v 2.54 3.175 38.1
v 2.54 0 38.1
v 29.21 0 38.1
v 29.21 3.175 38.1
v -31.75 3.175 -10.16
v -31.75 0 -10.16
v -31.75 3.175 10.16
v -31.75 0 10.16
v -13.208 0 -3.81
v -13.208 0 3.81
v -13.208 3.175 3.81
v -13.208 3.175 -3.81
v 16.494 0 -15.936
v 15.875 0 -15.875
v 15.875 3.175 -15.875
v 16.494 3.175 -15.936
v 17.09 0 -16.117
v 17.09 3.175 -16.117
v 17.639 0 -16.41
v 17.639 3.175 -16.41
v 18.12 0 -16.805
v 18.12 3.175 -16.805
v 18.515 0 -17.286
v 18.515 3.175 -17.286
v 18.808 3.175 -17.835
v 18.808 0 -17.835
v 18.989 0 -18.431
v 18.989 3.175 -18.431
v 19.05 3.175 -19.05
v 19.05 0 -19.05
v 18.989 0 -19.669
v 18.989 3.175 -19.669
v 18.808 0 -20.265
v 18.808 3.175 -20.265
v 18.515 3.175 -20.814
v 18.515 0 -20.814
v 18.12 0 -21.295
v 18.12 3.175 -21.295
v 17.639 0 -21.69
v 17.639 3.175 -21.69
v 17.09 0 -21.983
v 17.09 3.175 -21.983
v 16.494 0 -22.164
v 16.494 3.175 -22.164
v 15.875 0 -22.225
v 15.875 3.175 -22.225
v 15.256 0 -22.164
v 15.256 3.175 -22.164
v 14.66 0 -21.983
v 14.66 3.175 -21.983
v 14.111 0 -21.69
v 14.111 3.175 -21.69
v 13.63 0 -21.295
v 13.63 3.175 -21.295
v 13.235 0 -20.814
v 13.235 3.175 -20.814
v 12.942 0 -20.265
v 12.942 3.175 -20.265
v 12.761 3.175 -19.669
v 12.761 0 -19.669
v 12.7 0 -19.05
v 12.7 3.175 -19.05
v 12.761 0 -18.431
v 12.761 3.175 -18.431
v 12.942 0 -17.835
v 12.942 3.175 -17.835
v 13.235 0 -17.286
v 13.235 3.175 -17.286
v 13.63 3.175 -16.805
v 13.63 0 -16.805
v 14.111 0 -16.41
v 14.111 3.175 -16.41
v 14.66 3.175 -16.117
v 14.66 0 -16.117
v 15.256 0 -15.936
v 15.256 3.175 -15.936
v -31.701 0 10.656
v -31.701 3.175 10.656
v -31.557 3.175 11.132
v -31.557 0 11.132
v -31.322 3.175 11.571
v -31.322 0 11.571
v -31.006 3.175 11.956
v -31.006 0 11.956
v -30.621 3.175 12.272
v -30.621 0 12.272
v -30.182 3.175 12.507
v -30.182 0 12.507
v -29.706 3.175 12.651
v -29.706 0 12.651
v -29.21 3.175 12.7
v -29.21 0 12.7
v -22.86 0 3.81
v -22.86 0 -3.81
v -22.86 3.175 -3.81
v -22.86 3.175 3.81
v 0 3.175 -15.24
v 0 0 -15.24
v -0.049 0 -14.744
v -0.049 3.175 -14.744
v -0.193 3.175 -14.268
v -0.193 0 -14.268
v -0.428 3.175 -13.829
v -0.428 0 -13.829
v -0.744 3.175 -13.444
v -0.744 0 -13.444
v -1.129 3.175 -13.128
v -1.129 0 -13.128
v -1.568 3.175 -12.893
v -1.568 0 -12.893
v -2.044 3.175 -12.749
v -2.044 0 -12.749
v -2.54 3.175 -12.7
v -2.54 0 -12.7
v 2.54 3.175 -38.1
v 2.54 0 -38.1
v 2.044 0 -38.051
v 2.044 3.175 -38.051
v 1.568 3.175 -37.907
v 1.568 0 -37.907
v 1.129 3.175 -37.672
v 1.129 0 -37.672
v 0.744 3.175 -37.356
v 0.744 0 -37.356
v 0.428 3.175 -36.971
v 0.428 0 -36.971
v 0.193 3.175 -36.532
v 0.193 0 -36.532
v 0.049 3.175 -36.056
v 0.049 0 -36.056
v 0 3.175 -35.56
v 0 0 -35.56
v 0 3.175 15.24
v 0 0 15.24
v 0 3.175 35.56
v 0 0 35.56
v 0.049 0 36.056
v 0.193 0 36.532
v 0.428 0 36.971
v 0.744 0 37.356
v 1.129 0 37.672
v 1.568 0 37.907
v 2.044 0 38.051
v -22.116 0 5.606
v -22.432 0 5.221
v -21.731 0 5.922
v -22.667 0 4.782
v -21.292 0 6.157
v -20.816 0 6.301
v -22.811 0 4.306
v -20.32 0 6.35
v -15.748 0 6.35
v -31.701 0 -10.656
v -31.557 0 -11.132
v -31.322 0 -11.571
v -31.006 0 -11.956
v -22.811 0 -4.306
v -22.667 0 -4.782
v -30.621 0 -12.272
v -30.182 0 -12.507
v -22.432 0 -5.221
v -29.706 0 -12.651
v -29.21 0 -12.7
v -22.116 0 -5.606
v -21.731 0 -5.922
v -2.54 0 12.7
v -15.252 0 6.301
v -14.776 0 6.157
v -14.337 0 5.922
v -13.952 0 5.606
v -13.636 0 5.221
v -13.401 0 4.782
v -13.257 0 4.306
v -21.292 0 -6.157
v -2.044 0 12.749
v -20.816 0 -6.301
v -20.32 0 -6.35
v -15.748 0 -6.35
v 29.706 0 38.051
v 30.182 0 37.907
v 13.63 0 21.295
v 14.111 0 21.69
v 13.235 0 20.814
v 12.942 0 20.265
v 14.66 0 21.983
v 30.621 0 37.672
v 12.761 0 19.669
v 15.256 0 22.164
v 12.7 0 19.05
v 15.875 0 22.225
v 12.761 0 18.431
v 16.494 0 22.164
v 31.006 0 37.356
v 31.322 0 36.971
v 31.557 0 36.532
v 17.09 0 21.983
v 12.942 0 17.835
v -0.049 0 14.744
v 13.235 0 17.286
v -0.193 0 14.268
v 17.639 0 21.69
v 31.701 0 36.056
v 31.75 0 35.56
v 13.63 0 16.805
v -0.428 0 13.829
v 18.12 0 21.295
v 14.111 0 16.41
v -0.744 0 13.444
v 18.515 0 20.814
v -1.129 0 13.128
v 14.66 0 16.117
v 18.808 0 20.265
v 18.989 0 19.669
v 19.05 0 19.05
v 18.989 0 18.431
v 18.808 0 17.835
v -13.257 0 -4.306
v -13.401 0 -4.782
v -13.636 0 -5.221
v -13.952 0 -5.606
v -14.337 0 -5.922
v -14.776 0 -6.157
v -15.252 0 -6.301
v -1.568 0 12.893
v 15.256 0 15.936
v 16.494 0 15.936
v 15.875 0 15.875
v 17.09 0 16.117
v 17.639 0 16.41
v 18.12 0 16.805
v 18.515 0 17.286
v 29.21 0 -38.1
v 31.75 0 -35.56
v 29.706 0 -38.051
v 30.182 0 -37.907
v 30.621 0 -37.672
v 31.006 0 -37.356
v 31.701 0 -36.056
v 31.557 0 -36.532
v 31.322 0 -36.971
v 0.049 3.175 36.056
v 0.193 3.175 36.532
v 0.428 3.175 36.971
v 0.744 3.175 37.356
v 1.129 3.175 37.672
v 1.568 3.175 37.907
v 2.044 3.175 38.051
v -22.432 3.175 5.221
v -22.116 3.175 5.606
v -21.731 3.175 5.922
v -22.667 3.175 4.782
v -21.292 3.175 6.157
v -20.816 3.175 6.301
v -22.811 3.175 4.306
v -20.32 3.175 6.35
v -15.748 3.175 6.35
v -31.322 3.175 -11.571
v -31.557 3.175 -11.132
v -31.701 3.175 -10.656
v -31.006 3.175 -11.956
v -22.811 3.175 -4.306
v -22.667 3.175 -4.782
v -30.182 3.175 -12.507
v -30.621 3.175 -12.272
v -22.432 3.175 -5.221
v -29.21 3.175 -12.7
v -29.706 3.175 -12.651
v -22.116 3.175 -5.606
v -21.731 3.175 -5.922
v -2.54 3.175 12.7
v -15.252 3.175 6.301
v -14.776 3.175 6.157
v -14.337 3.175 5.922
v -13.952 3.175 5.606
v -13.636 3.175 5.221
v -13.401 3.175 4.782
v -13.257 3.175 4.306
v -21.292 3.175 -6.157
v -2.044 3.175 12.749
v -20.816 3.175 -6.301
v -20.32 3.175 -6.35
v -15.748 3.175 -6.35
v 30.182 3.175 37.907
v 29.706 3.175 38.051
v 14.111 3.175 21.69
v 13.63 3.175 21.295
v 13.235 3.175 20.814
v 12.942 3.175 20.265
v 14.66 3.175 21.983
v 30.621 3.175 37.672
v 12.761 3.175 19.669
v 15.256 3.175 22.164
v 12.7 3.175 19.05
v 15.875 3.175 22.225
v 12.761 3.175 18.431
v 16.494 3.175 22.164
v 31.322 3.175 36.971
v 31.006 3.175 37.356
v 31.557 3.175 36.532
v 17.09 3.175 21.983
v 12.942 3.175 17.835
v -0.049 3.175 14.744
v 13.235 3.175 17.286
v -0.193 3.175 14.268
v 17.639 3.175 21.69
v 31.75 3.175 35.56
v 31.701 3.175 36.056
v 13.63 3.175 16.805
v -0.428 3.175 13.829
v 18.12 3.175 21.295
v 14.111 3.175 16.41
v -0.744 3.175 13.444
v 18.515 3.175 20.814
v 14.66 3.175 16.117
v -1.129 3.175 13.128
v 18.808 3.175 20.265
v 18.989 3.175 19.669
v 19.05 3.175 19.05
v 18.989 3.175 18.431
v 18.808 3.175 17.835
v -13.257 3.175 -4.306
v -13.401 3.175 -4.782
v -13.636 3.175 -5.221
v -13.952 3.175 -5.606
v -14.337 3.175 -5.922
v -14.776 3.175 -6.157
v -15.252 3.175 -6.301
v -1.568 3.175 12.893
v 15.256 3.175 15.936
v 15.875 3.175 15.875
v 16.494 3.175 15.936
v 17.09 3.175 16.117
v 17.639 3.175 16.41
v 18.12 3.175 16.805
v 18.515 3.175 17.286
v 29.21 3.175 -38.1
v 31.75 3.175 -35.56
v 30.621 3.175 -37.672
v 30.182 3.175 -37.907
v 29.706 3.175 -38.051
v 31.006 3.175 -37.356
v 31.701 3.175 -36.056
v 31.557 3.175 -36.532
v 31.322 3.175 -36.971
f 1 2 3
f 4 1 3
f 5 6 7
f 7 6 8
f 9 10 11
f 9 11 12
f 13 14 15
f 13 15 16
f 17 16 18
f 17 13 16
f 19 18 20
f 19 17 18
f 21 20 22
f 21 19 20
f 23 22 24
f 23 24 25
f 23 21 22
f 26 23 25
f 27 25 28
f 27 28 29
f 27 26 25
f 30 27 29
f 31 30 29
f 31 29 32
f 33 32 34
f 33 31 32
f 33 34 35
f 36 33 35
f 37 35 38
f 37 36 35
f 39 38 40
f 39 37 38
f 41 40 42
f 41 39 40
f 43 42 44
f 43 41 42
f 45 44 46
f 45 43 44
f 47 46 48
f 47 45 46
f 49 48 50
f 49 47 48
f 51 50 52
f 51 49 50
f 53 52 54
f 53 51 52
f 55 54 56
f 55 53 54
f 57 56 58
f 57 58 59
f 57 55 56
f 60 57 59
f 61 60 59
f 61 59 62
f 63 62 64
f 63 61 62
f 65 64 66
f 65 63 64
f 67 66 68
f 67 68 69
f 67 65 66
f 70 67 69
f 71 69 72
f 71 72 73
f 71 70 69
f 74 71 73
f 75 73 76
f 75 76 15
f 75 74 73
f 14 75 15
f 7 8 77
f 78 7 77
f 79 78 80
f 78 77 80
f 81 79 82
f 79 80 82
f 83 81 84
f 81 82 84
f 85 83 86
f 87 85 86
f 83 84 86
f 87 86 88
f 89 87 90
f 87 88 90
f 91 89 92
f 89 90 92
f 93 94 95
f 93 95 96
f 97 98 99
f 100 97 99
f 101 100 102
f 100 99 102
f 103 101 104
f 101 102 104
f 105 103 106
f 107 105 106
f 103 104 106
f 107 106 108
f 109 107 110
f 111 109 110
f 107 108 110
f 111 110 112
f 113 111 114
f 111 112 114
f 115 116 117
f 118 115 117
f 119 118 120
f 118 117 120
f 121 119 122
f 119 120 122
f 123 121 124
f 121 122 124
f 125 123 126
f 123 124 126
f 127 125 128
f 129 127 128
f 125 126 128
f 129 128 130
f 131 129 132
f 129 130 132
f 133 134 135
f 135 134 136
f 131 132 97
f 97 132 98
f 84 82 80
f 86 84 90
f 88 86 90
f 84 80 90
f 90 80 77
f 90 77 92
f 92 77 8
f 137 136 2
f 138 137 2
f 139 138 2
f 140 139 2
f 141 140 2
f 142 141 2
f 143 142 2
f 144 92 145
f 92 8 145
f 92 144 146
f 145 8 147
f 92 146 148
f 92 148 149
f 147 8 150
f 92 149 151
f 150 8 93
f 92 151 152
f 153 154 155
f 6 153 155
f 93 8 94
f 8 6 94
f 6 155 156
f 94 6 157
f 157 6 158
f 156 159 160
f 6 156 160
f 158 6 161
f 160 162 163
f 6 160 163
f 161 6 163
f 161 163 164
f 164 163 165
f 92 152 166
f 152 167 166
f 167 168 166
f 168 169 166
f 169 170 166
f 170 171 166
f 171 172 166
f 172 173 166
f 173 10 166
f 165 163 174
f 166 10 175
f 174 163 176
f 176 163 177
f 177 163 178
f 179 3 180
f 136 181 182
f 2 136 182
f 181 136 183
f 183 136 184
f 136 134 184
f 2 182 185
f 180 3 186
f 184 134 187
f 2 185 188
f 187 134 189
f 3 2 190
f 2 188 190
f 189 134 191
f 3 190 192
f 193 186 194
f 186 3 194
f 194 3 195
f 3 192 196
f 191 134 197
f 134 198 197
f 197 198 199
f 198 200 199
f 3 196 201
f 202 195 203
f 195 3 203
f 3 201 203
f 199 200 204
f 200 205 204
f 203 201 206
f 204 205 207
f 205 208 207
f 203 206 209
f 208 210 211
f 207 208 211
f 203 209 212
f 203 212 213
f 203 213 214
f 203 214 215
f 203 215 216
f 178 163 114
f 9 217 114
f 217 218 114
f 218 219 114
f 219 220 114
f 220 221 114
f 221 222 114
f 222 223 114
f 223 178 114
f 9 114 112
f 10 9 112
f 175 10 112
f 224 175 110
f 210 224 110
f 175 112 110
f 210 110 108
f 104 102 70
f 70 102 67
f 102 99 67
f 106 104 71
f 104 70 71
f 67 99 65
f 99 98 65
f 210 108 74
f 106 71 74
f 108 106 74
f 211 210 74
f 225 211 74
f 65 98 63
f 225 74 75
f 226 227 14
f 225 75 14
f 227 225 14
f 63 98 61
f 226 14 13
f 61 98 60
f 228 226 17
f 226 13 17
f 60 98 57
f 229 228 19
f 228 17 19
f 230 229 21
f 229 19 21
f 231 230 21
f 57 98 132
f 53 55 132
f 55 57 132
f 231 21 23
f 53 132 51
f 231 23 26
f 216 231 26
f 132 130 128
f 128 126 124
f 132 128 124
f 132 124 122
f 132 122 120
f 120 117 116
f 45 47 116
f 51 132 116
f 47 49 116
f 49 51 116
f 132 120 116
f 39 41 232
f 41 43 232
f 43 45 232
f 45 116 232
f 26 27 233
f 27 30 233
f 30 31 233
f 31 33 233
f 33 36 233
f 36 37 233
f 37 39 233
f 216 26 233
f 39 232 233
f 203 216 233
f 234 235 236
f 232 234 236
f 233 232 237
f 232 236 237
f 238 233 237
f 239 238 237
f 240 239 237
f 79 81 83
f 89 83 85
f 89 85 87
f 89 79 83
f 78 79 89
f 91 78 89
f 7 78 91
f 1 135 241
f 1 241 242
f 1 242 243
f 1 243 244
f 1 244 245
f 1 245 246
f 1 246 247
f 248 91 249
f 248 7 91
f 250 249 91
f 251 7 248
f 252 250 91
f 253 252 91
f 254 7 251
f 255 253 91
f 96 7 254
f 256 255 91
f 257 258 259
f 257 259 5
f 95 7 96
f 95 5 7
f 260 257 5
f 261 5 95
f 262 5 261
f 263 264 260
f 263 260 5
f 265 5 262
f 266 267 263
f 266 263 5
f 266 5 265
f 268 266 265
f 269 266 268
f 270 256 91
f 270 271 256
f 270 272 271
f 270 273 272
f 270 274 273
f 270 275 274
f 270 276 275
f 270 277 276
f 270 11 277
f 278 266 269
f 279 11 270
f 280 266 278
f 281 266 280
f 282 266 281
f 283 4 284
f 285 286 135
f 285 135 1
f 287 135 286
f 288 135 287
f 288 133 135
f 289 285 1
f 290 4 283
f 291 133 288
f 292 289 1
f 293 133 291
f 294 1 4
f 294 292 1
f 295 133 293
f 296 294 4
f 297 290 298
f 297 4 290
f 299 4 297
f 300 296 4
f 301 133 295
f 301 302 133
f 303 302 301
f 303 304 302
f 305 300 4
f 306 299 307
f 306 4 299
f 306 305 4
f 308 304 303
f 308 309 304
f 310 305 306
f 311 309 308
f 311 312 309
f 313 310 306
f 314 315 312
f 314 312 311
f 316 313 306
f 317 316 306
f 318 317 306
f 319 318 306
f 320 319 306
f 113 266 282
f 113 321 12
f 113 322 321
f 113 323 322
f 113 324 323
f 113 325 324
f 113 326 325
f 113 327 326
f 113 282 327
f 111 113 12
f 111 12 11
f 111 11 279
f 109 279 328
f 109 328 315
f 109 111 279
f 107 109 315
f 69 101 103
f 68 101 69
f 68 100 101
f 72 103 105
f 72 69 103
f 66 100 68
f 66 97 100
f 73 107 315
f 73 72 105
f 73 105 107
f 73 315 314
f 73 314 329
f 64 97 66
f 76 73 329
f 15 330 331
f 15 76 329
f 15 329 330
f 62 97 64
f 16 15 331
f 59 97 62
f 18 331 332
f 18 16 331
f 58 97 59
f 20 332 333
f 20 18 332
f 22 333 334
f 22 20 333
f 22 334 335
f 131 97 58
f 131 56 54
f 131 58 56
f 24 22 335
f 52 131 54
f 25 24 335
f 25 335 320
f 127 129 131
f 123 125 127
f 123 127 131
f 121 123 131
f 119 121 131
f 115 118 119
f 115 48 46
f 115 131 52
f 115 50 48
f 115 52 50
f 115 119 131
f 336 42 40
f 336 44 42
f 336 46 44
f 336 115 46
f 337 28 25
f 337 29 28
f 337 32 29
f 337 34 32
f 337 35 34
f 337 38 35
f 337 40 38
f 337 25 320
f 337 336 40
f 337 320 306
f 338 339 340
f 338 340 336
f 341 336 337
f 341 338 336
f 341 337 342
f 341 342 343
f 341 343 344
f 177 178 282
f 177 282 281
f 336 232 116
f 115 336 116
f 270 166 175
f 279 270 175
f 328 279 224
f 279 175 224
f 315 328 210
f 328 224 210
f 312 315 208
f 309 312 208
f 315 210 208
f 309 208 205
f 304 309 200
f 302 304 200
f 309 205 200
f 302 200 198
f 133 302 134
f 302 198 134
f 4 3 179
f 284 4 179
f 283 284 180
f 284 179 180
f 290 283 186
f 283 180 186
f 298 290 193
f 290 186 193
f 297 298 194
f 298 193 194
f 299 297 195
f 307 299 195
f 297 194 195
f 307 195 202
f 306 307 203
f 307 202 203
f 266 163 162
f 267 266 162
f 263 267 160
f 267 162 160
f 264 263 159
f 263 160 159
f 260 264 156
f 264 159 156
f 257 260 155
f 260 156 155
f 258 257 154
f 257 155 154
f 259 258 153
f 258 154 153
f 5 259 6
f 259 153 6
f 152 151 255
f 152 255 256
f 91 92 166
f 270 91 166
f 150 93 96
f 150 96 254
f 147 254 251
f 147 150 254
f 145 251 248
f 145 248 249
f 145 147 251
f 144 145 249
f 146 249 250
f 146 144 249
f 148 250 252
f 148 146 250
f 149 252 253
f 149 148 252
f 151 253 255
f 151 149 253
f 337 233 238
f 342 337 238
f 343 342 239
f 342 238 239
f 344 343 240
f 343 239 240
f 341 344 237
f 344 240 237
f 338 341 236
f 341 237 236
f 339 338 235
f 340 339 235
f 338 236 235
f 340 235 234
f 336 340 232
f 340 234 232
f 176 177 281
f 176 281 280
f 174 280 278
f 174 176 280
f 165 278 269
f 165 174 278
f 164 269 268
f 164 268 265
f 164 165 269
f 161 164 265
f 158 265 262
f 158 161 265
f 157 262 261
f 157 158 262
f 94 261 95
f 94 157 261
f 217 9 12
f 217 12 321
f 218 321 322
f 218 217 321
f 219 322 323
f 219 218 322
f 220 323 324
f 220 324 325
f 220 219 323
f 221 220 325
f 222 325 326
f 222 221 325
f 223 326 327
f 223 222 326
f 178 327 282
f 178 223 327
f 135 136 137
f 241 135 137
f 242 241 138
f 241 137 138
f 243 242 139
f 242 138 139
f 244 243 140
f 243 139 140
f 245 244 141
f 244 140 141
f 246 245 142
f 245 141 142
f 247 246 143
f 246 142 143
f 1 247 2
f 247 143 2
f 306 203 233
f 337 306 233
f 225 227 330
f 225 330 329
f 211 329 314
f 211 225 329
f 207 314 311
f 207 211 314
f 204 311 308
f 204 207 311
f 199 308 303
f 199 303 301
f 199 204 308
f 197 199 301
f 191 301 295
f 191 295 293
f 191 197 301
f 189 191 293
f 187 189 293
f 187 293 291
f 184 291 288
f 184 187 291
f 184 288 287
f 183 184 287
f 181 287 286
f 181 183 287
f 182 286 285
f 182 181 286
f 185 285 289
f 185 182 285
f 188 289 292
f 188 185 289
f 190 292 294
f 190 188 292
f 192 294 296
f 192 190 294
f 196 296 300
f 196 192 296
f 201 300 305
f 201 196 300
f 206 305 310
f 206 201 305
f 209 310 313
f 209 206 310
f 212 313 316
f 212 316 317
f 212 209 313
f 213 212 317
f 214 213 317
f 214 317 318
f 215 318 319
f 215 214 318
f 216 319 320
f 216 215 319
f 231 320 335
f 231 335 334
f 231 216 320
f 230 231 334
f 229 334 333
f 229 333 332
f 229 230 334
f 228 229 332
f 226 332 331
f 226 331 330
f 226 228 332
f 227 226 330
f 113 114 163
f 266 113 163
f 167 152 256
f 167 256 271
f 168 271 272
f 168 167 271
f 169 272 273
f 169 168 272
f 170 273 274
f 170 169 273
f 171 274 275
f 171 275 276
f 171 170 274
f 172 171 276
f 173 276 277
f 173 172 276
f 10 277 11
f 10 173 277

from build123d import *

# Parameters (mm, degrees)
SKETCH1_R           = 3.175
BOSS_EXTRUDE1_DEPTH = 3.175


with BuildPart() as part:
    # Sketch1 → Boss-Extrude1 (new body)
    with BuildSketch(Plane(origin=(0, 0, 0), x_dir=(1, 0, 0), z_dir=(0, 1, 0))):
        with BuildLine():
            Line((2.54, -38.1), (29.21, -38.1))
            ThreePointArc((29.21, -38.1), (31.006051224, -37.356051224), (31.75, -35.56))
            Line((31.75, -35.56), (31.75, 35.56))
            ThreePointArc((31.75, 35.56), (31.006051224, 37.356051224), (29.21, 38.1))
            Line((29.21, 38.1), (2.54, 38.1))
            ThreePointArc((2.54, 38.1), (0.743948776, 37.356051224), (0, 35.56))
            Line((0, 35.56), (0, 15.24))
            ThreePointArc((0, 15.24), (-0.743948776, 13.443948776), (-2.54, 12.7))
            Line((-2.54, 12.7), (-29.21, 12.7))
            ThreePointArc((-29.21, 12.7), (-31.006051224, 11.956051224), (-31.75, 10.16))
            Line((-31.75, 10.16), (-31.75, -10.16))
            ThreePointArc((-31.75, -10.16), (-31.006051224, -11.956051224), (-29.21, -12.7))
            Line((-29.21, -12.7), (-2.54, -12.7))
            ThreePointArc((-2.54, -12.7), (-0.743948776, -13.443948776), (0, -15.24))
            Line((0, -15.24), (0, -35.56))
            ThreePointArc((0, -35.56), (0.743948776, -37.356051224), (2.54, -38.1))
        make_face()
        with Locations(Location((15.875, 19.05, 0), (0, 0, 270))):
            Circle(SKETCH1_R, mode=Mode.SUBTRACT)
        with Locations(Location((15.875, -19.05, 0), (0, 0, 90))):
            Circle(SKETCH1_R, mode=Mode.SUBTRACT)
        with BuildLine():
            Line((-20.32, -6.35), (-15.748, -6.35))
            ThreePointArc((-15.748, -6.35), (-13.951948776, -5.606051224), (-13.208, -3.81))
            Line((-13.208, -3.81), (-13.208, 3.81))
            ThreePointArc((-13.208, 3.81), (-13.951948776, 5.606051224), (-15.748, 6.35))
            Line((-15.748, 6.35), (-20.32, 6.35))
            ThreePointArc((-20.32, 6.35), (-22.116051224, 5.606051224), (-22.86, 3.81))
            Line((-22.86, 3.81), (-22.86, -3.81))
            ThreePointArc((-22.86, -3.81), (-22.116051224, -5.606051224), (-20.32, -6.35))
        make_face(mode=Mode.SUBTRACT)
    extrude(amount=BOSS_EXTRUDE1_DEPTH)


solid = part.part
